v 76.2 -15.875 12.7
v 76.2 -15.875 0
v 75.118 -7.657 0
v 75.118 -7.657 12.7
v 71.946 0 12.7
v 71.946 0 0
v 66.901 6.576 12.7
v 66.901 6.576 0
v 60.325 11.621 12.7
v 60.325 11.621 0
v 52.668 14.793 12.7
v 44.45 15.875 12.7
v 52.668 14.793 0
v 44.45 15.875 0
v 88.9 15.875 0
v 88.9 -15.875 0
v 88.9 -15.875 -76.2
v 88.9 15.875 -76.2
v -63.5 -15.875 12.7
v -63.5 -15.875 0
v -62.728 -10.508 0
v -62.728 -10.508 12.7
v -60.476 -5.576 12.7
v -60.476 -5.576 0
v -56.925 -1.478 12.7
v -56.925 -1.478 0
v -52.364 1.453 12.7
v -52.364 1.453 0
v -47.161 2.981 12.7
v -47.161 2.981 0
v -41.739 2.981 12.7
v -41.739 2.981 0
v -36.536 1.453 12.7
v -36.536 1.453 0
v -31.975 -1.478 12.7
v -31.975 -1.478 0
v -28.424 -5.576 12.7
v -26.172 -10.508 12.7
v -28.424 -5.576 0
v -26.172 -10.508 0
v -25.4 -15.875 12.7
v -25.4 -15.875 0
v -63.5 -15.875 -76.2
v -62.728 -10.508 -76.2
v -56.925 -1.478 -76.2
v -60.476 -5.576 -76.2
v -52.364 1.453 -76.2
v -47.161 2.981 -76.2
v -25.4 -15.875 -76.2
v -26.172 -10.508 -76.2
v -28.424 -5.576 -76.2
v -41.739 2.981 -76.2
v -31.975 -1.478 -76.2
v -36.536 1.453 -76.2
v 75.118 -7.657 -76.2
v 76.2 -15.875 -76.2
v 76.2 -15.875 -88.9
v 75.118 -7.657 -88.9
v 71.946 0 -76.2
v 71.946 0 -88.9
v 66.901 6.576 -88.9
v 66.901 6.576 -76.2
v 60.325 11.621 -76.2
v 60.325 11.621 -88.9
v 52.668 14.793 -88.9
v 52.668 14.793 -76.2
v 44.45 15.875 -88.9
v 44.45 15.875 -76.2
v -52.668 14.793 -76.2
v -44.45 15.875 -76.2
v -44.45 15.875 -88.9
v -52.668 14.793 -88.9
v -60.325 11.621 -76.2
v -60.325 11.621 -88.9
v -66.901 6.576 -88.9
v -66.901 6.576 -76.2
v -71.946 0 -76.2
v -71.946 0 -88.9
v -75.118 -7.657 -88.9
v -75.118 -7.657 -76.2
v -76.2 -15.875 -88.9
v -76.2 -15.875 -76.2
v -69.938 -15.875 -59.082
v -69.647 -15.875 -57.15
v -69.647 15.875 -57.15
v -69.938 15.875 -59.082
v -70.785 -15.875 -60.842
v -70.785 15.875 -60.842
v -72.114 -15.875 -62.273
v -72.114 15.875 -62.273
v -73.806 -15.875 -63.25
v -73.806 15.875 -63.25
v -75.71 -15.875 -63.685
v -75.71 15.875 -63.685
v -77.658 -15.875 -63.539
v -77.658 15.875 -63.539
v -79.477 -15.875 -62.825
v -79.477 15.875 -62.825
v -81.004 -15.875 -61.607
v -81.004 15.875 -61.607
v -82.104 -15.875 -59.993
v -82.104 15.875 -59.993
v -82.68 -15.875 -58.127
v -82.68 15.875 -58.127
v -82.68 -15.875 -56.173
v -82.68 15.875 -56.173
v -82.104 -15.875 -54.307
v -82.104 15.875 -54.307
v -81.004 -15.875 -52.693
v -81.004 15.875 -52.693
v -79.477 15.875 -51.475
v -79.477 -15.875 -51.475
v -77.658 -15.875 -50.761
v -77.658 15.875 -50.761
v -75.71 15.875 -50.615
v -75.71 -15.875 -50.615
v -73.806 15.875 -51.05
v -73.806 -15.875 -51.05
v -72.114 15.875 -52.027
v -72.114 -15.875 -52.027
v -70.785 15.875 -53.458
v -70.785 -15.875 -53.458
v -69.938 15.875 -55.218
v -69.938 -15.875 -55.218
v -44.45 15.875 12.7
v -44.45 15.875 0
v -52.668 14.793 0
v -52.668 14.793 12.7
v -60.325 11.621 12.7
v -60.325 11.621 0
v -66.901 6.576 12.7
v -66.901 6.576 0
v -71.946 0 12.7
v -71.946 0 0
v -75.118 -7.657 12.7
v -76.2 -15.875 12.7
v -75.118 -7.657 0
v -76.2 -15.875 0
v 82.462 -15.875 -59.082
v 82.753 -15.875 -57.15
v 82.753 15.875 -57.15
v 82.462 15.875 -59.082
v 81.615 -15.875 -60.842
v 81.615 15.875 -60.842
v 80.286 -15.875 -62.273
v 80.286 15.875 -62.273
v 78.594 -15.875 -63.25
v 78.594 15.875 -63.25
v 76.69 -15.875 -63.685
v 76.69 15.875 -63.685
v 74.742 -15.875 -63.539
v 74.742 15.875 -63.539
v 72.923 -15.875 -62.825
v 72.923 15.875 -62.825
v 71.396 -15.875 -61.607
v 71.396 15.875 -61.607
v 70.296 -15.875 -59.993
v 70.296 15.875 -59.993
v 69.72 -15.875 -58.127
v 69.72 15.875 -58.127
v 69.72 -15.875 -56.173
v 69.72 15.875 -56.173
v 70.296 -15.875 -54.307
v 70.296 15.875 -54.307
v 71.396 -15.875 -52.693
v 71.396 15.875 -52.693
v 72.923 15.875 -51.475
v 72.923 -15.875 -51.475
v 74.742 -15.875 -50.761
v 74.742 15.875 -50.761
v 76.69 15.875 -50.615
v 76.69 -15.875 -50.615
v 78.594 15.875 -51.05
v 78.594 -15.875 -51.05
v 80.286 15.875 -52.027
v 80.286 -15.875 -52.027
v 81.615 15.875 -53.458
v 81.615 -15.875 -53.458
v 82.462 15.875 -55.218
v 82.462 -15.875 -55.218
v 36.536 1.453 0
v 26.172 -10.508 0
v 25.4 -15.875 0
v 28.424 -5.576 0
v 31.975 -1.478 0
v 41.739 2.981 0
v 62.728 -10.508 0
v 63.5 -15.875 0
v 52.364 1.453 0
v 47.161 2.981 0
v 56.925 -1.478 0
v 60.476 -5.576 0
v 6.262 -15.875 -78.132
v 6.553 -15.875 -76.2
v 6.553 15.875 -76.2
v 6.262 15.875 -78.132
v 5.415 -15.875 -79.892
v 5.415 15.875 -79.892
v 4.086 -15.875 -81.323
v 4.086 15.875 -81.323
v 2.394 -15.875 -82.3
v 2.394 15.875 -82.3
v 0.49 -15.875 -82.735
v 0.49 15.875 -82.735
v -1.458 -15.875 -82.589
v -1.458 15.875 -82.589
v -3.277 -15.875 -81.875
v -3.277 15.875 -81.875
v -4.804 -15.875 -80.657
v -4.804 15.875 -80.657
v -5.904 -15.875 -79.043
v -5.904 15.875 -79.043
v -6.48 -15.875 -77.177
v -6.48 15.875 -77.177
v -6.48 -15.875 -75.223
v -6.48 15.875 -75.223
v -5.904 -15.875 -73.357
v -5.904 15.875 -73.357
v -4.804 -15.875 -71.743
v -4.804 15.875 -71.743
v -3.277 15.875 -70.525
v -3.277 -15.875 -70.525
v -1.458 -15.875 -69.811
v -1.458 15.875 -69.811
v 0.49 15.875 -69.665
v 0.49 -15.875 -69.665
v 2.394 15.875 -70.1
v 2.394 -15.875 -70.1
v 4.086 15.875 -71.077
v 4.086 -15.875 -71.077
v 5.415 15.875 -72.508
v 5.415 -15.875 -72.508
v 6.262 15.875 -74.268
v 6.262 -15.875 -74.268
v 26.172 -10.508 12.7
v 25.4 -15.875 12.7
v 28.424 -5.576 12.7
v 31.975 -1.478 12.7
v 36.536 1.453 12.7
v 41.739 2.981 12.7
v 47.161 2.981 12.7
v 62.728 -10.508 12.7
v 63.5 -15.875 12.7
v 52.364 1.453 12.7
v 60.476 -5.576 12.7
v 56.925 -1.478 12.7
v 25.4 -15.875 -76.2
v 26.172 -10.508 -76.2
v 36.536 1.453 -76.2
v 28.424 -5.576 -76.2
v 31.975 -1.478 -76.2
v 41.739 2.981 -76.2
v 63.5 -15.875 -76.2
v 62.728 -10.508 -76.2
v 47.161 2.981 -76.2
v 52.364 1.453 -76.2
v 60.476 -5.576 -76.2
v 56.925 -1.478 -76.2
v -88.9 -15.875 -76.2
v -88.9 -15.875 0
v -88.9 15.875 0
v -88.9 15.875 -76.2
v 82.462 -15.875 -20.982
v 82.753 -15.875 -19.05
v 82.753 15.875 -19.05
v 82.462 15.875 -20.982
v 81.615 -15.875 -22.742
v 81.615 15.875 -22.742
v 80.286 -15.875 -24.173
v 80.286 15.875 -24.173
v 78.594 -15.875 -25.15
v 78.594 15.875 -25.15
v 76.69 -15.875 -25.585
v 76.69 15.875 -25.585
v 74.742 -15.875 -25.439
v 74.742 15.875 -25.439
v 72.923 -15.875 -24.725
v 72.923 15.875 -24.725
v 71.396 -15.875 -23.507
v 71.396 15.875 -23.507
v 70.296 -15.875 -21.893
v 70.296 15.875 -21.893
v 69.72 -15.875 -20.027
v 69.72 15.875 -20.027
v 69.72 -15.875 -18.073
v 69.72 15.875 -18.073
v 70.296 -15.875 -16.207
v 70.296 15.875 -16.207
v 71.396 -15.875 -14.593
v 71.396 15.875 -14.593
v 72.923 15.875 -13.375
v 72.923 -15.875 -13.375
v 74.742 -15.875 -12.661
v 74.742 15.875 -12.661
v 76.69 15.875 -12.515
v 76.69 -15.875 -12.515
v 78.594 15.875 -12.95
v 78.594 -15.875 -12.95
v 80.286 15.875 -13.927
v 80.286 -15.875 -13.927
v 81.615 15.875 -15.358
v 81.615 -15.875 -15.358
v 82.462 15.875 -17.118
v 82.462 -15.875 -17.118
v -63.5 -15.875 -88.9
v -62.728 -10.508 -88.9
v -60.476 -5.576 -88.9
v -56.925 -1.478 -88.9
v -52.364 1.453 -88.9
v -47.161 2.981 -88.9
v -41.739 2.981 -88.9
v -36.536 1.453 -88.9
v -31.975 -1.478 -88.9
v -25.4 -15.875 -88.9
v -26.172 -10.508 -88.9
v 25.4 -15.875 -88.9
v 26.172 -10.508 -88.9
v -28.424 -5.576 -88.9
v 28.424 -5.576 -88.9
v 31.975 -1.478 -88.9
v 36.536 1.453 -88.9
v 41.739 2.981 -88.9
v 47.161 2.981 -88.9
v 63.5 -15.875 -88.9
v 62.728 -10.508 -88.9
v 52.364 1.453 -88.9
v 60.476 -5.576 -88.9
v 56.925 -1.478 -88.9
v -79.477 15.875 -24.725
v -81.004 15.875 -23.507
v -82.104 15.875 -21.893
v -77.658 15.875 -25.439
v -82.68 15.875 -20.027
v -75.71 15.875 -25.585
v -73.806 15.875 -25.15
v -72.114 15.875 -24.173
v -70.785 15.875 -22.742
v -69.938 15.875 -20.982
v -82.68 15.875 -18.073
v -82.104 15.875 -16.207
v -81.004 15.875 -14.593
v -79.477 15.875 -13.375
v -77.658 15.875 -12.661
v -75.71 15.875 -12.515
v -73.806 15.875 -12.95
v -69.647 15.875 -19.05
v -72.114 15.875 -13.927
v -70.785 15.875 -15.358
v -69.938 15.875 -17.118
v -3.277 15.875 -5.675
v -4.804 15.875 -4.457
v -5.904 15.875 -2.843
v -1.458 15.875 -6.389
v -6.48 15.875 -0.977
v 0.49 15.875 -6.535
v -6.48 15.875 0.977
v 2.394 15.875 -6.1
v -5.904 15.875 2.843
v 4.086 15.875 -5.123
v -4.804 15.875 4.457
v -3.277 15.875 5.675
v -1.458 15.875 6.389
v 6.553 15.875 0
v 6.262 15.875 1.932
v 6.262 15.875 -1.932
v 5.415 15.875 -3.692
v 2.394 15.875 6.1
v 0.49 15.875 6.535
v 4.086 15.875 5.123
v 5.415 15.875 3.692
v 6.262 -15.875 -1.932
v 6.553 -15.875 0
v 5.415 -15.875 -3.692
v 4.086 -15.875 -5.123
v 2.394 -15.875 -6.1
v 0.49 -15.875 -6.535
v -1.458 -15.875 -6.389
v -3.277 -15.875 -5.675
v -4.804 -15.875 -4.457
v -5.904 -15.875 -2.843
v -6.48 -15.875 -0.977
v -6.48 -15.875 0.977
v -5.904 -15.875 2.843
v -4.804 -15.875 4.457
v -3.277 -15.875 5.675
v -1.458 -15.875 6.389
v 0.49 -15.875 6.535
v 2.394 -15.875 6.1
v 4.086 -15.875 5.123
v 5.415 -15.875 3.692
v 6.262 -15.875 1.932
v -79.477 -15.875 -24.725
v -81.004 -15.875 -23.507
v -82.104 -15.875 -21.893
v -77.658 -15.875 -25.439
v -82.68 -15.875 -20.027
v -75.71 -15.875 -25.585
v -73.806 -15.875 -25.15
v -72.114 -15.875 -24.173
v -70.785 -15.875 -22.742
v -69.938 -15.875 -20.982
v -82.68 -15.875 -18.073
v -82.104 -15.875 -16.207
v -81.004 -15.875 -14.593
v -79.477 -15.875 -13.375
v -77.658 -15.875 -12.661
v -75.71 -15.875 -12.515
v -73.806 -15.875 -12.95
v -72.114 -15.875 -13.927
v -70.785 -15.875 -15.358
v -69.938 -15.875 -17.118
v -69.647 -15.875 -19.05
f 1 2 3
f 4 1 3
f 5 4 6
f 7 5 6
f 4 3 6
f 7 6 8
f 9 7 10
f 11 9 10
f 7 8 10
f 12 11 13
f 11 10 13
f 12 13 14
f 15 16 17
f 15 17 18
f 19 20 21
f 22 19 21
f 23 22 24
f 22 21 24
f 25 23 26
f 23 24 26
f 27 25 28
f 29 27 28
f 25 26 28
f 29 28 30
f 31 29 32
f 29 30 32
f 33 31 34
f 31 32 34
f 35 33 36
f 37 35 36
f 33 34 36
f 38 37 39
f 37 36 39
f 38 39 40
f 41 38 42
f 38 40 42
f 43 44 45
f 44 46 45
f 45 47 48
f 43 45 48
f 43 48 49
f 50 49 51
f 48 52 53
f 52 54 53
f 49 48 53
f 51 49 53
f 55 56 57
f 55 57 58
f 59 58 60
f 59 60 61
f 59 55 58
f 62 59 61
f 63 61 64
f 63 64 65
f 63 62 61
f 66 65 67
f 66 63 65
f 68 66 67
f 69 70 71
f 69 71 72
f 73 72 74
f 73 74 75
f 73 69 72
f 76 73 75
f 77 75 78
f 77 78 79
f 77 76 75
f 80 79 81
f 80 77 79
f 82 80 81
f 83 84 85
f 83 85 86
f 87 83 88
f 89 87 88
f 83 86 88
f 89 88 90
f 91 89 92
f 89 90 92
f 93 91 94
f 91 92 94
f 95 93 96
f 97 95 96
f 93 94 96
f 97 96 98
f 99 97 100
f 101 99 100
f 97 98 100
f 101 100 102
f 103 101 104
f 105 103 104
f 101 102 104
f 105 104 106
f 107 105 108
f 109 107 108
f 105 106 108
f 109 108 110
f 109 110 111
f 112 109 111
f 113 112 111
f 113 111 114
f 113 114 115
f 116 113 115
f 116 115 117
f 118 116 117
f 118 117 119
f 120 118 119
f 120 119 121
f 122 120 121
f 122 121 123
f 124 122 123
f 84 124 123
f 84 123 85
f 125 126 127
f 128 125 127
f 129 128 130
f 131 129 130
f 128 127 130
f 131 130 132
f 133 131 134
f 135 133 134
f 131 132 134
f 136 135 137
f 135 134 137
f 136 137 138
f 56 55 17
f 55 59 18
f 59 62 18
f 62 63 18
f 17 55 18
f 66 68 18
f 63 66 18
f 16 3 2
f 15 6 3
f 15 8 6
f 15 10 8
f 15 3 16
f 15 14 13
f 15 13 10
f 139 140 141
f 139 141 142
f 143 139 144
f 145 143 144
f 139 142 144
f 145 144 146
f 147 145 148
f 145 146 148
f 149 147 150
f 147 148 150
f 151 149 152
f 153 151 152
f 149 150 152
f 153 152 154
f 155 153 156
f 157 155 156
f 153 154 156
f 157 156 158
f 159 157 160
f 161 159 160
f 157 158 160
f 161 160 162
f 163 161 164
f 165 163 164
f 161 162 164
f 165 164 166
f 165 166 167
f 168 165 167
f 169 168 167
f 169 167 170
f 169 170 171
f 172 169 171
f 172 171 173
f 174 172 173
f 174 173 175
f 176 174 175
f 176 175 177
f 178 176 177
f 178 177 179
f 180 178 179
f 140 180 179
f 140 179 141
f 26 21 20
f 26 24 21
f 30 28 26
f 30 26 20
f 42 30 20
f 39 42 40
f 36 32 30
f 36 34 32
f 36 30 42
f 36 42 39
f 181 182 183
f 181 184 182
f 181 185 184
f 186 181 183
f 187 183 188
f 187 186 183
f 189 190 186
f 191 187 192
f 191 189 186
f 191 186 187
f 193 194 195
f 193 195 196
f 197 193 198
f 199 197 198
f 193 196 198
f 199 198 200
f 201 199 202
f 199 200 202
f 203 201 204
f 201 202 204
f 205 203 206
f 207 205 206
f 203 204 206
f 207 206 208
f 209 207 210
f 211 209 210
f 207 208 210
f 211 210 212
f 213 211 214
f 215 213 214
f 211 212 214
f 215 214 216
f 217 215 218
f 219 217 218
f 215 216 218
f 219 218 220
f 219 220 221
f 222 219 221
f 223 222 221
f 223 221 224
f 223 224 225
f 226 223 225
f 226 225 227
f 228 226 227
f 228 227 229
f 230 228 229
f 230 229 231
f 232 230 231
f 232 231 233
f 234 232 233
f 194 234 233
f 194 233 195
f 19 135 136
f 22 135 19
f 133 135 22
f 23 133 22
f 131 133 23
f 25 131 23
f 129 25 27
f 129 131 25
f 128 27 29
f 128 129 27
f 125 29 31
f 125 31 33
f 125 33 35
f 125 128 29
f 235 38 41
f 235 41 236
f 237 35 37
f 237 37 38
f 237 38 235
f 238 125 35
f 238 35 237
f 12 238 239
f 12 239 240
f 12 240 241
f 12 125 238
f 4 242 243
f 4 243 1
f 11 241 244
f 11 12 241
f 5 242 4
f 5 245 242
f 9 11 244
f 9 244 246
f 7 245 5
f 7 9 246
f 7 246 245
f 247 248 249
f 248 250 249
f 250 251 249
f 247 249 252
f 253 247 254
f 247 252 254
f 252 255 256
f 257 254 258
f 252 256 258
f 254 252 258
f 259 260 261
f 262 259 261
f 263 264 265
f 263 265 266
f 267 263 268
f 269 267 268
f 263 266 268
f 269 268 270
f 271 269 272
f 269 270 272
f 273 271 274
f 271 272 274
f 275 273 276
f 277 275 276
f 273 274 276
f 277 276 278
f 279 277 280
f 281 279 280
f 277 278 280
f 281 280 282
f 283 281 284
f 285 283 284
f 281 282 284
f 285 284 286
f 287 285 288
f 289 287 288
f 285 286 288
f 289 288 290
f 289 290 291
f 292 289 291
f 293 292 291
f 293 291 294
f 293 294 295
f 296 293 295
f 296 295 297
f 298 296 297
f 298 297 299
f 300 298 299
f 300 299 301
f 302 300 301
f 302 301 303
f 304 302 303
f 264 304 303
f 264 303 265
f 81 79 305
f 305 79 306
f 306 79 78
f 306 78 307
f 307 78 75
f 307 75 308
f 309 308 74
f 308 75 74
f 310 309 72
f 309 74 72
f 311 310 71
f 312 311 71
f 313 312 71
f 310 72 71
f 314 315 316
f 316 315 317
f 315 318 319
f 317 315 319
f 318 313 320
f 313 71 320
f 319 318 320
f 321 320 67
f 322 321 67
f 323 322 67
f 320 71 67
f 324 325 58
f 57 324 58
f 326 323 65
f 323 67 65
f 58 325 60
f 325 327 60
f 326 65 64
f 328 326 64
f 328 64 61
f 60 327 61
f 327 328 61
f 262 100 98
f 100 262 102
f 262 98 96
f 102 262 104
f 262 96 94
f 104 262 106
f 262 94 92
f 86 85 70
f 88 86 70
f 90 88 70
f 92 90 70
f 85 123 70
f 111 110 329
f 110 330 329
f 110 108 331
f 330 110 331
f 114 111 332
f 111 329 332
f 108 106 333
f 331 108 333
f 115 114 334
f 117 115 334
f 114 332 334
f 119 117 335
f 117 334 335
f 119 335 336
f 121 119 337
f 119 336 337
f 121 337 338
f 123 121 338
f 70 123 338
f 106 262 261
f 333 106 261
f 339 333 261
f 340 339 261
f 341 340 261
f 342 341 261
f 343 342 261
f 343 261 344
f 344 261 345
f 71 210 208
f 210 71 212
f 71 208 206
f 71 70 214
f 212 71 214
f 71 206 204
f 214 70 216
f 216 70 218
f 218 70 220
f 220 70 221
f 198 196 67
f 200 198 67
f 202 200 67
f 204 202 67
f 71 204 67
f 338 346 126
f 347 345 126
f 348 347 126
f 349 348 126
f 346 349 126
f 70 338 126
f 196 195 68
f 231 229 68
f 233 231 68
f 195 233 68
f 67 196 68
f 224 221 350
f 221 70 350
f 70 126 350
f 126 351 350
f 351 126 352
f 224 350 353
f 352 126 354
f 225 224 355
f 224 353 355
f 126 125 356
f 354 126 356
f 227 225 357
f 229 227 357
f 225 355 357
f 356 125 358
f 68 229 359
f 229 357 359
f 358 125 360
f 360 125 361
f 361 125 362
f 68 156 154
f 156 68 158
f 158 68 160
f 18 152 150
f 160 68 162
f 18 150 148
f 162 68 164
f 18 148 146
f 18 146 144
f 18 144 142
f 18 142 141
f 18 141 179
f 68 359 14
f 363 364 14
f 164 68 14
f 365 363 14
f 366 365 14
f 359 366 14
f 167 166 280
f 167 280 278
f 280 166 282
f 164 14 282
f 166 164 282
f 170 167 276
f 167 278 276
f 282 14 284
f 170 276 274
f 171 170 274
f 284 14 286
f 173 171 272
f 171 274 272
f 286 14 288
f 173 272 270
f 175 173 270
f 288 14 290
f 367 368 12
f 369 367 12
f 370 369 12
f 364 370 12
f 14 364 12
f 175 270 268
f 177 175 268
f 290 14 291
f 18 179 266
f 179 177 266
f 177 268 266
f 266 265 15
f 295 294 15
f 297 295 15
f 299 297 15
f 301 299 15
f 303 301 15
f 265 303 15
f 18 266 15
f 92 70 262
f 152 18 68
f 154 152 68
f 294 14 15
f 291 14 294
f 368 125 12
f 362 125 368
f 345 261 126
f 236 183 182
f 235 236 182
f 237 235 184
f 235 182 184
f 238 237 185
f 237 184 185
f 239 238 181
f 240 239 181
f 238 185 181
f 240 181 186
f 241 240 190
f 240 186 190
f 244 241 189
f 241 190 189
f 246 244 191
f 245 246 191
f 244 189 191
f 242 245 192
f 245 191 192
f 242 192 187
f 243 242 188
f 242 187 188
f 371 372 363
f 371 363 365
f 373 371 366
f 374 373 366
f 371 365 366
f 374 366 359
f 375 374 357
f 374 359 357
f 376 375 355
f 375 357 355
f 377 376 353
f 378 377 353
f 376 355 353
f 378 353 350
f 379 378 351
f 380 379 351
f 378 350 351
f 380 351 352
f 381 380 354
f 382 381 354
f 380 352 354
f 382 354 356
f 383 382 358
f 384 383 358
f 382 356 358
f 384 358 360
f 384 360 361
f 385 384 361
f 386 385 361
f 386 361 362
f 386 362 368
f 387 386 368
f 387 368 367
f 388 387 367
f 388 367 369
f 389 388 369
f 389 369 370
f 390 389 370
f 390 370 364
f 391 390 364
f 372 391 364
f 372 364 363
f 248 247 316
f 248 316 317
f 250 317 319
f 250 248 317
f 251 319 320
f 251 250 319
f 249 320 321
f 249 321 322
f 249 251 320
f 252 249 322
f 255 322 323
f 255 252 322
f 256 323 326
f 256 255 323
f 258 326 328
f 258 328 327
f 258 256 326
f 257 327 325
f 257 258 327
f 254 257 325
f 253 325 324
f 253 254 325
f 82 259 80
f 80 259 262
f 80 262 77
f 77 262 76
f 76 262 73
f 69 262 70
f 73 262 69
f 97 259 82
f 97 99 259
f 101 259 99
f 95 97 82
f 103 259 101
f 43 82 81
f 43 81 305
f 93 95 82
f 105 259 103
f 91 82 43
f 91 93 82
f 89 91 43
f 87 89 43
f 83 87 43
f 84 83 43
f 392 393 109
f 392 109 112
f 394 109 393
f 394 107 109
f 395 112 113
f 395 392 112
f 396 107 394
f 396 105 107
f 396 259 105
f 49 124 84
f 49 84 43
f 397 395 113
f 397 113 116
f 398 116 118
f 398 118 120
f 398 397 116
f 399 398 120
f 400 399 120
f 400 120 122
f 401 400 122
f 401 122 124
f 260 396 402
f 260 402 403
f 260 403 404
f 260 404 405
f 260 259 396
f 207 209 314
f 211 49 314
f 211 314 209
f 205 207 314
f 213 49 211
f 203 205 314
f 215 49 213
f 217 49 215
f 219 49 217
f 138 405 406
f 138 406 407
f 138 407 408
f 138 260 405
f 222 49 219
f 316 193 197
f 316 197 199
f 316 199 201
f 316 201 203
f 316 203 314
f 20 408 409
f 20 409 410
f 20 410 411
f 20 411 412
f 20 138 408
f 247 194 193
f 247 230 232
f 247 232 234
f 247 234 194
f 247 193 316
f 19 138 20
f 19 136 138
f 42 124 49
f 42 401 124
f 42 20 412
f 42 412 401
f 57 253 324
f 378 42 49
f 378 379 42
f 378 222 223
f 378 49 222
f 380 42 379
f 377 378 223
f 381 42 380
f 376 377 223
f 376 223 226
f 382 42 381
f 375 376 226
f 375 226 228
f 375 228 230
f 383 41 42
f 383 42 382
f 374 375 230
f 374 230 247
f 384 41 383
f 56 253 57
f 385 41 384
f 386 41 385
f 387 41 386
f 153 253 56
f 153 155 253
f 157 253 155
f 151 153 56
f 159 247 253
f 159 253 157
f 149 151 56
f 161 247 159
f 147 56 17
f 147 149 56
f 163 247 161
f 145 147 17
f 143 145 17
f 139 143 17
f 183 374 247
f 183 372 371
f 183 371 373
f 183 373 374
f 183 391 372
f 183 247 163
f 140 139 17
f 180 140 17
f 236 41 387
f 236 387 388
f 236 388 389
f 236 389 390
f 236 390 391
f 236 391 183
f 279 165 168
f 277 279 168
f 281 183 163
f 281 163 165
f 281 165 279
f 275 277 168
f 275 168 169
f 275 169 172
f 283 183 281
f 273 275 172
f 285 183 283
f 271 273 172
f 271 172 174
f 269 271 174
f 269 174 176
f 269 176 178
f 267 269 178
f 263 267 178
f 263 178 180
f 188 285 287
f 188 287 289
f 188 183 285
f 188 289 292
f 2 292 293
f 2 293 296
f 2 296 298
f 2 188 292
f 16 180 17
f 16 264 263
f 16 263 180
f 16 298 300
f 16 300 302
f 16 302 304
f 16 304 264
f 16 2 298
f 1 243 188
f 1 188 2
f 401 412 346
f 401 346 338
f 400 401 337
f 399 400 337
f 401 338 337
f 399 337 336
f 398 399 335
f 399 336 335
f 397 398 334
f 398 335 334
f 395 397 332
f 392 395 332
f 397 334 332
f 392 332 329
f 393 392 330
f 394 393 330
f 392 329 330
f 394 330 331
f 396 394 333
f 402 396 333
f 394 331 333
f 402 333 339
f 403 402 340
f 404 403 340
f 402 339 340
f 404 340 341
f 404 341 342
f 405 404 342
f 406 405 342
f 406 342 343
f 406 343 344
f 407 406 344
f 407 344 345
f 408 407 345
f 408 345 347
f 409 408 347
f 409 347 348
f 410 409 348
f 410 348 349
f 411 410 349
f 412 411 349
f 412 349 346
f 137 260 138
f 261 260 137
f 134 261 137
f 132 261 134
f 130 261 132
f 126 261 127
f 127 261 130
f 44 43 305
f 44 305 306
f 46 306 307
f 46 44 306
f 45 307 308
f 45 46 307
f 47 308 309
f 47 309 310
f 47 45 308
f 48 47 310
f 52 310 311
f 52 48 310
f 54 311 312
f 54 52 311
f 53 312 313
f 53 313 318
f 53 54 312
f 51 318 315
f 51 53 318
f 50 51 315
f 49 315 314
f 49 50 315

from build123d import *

# Parameters (mm, degrees)
SKETCH2_W           = 177.8
SKETCH2_H           = 31.75
BASE_BLUE_DEPTH     = 76.2
BASE_YELLOW_R_DEPTH = 12.7
BASE_YELLOW_L_DEPTH = 12.7
SKETCH3_R           = 6.5532
CYL_RED_DEPTH       = 32.75


with BuildPart() as part:
    # Sketch2 → base-blue (new body)
    with BuildSketch(Plane.XY):
        Rectangle(SKETCH2_W, SKETCH2_H)
    extrude(amount=-BASE_BLUE_DEPTH)

    # Sketch4 → base-yellow-R (add)
    with BuildSketch(Plane.XY):
        with BuildLine():
            Line((44.45, 15.875), (-44.45, 15.875))
            ThreePointArc((-44.45, 15.875), (-66.900640303, 6.575640303), (-76.2, -15.875))
            Line((-76.2, -15.875), (-63.5, -15.875))
            ThreePointArc((-63.5, -15.875), (-44.45, 3.175), (-25.4, -15.875))
            Line((-25.4, -15.875), (25.4, -15.875))
            ThreePointArc((25.4, -15.875), (44.45, 3.175), (63.5, -15.875))
            Line((63.5, -15.875), (76.2, -15.875))
            ThreePointArc((76.2, -15.875), (66.900640303, 6.575640303), (44.45, 15.875))
        make_face()
    extrude(amount=BASE_YELLOW_R_DEPTH)

    # Sketch5 → base-yellow-L (add)
    with BuildSketch(Plane(origin=(0, 0, -76.2), x_dir=(-1, 0, 0), z_dir=(0, 0, -1))):
        with BuildLine():
            Line((76.2, -15.875), (63.5, -15.875))
            ThreePointArc((63.5, -15.875), (44.45, 3.175), (25.4, -15.875))
            Line((25.4, -15.875), (-25.4, -15.875))
            ThreePointArc((-25.4, -15.875), (-44.45, 3.175), (-63.5, -15.875))
            Line((-63.5, -15.875), (-76.2, -15.875))
            ThreePointArc((-76.2, -15.875), (-66.900640303, 6.575640303), (-44.45, 15.875))
            Line((-44.45, 15.875), (44.45, 15.875))
            ThreePointArc((44.45, 15.875), (66.900640303, 6.575640303), (76.2, -15.875))
        make_face()
    extrude(amount=BASE_YELLOW_L_DEPTH)

    # Sketch3 → cyl-red (cut, through all)
    with BuildSketch(Plane(origin=(0, 15.875, 0), x_dir=(1, 0, 0), z_dir=(0, 1, 0))):
        with Locations((-76.2, 19.05)):
            Circle(SKETCH3_R)
        with Locations((-76.2, 57.15)):
            Circle(SKETCH3_R)
        with Locations((76.2, 57.15)):
            Circle(SKETCH3_R)
        with Locations((76.2, 19.05)):
            Circle(SKETCH3_R)
        Circle(SKETCH3_R)
        with Locations((0, 76.2)):
            Circle(SKETCH3_R)
    extrude(amount=-CYL_RED_DEPTH, mode=Mode.SUBTRACT)


solid = part.part
